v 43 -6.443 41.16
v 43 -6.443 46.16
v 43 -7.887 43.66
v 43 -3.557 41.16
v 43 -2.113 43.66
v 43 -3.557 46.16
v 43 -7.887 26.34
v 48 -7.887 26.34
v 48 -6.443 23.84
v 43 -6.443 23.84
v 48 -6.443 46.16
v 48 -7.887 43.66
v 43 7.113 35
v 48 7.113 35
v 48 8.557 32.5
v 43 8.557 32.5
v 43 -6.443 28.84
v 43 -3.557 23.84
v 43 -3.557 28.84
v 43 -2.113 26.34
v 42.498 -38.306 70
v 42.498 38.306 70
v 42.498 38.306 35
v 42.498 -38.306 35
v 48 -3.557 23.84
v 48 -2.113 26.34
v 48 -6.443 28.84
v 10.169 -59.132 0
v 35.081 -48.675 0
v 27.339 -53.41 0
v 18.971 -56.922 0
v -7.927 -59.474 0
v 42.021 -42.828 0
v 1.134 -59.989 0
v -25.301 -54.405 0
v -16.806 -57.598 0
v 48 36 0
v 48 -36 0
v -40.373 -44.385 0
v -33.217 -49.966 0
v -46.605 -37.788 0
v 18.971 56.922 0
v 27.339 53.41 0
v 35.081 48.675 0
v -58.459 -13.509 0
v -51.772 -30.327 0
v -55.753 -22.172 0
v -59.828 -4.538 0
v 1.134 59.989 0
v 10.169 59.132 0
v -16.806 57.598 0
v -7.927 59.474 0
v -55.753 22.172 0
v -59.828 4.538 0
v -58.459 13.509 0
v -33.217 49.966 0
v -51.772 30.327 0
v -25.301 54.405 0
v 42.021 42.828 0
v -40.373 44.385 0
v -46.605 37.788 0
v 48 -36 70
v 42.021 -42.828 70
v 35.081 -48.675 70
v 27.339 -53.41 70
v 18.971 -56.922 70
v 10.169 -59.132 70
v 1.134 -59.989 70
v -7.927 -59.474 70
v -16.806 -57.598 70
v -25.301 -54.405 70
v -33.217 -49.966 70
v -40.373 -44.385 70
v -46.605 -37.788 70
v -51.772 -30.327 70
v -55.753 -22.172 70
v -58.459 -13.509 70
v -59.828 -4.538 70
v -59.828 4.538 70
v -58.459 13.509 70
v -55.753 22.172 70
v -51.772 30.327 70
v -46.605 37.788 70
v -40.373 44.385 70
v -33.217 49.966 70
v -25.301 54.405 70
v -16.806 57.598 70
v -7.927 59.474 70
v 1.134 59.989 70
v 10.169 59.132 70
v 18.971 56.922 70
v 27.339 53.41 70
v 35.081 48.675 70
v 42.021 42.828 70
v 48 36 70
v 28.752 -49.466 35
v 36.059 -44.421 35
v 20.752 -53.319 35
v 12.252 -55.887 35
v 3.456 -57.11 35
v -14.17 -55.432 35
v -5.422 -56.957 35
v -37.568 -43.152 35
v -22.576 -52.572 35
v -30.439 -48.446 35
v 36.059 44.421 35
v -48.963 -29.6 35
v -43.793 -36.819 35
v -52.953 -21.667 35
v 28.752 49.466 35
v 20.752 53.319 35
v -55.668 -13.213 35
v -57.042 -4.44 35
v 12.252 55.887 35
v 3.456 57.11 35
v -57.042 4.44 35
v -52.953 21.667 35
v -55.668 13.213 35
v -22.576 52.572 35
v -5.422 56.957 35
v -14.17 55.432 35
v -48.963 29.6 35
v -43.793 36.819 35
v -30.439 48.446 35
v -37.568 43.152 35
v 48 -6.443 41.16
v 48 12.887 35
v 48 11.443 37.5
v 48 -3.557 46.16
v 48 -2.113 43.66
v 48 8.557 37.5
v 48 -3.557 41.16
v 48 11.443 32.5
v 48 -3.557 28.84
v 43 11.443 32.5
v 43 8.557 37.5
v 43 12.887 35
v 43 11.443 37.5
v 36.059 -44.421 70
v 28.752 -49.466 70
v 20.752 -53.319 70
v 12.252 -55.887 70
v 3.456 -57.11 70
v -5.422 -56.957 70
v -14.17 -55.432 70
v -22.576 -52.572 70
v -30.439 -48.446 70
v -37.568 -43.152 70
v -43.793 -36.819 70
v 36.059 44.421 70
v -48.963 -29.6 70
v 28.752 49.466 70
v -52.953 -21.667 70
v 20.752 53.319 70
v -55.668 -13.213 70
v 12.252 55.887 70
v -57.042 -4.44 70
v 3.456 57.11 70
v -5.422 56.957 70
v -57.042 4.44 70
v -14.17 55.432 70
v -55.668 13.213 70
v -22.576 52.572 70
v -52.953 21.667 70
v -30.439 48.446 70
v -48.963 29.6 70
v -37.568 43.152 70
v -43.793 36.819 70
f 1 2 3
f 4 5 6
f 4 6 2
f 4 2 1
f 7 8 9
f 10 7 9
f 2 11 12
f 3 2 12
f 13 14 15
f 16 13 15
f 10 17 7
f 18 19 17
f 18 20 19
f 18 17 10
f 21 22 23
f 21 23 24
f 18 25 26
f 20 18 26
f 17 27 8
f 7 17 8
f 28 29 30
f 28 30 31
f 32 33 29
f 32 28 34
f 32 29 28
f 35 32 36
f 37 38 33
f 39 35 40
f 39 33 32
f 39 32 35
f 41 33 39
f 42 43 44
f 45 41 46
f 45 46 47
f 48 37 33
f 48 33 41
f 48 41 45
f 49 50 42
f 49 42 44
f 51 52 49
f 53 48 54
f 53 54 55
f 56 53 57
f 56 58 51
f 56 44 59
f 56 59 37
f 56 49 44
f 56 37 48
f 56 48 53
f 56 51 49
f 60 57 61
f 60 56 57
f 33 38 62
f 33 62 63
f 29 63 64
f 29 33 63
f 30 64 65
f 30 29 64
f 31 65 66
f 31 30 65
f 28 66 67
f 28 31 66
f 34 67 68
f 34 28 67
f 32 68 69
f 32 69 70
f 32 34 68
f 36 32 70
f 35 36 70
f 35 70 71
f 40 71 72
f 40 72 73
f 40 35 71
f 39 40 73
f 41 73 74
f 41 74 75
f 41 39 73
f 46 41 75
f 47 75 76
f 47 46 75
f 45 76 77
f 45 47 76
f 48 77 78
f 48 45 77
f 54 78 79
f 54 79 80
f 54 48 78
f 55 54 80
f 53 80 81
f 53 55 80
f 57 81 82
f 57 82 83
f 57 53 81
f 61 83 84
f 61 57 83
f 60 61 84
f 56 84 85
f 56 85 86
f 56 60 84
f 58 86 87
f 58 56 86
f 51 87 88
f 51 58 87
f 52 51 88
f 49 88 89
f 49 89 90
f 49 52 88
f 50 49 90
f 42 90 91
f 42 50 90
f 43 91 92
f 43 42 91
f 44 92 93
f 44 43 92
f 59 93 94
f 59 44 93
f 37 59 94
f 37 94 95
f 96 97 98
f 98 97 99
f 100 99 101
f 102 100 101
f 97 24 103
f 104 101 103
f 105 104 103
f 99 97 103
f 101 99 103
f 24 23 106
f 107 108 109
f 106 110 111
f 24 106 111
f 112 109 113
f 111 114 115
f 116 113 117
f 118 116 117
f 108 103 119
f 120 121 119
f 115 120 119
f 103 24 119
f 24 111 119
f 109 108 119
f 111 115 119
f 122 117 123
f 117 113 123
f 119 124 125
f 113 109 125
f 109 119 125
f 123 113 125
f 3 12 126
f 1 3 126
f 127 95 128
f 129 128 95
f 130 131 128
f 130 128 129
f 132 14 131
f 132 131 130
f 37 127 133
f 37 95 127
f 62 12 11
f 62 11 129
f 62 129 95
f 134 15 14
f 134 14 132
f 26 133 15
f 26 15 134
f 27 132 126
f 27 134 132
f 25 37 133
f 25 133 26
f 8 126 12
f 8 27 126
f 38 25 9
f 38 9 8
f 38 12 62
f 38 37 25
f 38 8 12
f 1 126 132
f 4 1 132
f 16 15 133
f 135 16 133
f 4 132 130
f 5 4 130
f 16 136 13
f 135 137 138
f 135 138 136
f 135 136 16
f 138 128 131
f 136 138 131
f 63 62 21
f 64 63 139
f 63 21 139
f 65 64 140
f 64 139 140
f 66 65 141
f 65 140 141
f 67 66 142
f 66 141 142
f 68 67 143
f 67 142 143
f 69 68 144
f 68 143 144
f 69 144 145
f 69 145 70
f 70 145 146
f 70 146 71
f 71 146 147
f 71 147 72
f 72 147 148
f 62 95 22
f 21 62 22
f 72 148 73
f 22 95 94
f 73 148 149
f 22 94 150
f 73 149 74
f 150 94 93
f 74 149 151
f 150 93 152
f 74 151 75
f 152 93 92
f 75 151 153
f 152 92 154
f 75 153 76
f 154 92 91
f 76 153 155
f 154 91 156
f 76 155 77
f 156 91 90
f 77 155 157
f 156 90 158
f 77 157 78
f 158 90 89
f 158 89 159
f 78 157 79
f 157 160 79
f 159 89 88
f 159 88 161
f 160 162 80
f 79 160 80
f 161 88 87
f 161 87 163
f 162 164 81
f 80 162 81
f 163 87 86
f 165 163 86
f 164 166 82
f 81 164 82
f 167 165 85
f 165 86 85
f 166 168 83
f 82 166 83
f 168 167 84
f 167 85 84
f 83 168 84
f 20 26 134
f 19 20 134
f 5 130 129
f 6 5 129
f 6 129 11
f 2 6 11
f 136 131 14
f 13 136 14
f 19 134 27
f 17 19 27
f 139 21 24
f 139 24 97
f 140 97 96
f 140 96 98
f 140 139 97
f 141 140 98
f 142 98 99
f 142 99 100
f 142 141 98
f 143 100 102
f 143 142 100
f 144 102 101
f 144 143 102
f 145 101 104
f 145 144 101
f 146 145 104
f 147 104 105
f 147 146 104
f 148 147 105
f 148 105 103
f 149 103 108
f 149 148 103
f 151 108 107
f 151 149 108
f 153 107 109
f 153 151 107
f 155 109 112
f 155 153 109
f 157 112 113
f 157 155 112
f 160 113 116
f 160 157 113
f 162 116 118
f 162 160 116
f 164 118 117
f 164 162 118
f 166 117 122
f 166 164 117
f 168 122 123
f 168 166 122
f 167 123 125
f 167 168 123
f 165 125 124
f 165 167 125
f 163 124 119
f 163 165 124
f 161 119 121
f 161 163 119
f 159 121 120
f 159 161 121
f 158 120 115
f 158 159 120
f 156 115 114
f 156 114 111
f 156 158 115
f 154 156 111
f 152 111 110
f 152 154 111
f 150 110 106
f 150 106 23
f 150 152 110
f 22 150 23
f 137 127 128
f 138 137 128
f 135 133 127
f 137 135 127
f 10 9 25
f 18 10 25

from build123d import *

# Parameters (mm, degrees)
EXTRUDE_3_DEPTH     = 70
CUT_EXTRUDE_2_DEPTH = 5
CUT_EXTRUDE_4_DEPTH = 35


with BuildPart() as part:
    # 草图1 → 凸台-拉伸3 (new body)
    with BuildSketch(Plane.XY):
        with BuildLine():
            Line((48, 36), (48, -36))
            ThreePointArc((48, -36), (-60, 0), (48, 36))
        make_face()
    extrude(amount=EXTRUDE_3_DEPTH)

    # 草图4 → 切除-拉伸2 (cut)
    with BuildSketch(Plane(origin=(48, 0, 0), x_dir=(0, 0, -1), z_dir=(1, 0, 0))):
        Polygon((-28.839745962, -3.556624327), (-28.839745962, -6.443375673), (-26.339745962, -7.886751346), (-23.839745962, -6.443375673), (-23.839745962, -3.556624327), (-26.339745962, -2.113248654), align=None)
        Polygon((-35, 7.113248654), (-32.5, 8.556624327), (-32.5, 11.443375673), (-35, 12.886751346), (-37.5, 11.443375673), (-37.5, 8.556624327), align=None)
        Polygon((-41.160254038, -3.556624327), (-43.660254038, -2.113248654), (-46.160254038, -3.556624327), (-46.160254038, -6.443375673), (-43.660254038, -7.886751346), (-41.160254038, -6.443375673), align=None)
    extrude(amount=-CUT_EXTRUDE_2_DEPTH, mode=Mode.SUBTRACT)

    # 草图6 → 切除-拉伸4 (cut)
    with BuildSketch(Plane.XY.offset(70)):
        with BuildLine():
            Line((42.4984665, 38.306424351), (42.4984665, -38.306424351))
            ThreePointArc((42.4984665, -38.306424351), (-57.214524392, 0), (42.4984665, 38.306424351))
        make_face()
    extrude(amount=-CUT_EXTRUDE_4_DEPTH, mode=Mode.SUBTRACT)


solid = part.part
